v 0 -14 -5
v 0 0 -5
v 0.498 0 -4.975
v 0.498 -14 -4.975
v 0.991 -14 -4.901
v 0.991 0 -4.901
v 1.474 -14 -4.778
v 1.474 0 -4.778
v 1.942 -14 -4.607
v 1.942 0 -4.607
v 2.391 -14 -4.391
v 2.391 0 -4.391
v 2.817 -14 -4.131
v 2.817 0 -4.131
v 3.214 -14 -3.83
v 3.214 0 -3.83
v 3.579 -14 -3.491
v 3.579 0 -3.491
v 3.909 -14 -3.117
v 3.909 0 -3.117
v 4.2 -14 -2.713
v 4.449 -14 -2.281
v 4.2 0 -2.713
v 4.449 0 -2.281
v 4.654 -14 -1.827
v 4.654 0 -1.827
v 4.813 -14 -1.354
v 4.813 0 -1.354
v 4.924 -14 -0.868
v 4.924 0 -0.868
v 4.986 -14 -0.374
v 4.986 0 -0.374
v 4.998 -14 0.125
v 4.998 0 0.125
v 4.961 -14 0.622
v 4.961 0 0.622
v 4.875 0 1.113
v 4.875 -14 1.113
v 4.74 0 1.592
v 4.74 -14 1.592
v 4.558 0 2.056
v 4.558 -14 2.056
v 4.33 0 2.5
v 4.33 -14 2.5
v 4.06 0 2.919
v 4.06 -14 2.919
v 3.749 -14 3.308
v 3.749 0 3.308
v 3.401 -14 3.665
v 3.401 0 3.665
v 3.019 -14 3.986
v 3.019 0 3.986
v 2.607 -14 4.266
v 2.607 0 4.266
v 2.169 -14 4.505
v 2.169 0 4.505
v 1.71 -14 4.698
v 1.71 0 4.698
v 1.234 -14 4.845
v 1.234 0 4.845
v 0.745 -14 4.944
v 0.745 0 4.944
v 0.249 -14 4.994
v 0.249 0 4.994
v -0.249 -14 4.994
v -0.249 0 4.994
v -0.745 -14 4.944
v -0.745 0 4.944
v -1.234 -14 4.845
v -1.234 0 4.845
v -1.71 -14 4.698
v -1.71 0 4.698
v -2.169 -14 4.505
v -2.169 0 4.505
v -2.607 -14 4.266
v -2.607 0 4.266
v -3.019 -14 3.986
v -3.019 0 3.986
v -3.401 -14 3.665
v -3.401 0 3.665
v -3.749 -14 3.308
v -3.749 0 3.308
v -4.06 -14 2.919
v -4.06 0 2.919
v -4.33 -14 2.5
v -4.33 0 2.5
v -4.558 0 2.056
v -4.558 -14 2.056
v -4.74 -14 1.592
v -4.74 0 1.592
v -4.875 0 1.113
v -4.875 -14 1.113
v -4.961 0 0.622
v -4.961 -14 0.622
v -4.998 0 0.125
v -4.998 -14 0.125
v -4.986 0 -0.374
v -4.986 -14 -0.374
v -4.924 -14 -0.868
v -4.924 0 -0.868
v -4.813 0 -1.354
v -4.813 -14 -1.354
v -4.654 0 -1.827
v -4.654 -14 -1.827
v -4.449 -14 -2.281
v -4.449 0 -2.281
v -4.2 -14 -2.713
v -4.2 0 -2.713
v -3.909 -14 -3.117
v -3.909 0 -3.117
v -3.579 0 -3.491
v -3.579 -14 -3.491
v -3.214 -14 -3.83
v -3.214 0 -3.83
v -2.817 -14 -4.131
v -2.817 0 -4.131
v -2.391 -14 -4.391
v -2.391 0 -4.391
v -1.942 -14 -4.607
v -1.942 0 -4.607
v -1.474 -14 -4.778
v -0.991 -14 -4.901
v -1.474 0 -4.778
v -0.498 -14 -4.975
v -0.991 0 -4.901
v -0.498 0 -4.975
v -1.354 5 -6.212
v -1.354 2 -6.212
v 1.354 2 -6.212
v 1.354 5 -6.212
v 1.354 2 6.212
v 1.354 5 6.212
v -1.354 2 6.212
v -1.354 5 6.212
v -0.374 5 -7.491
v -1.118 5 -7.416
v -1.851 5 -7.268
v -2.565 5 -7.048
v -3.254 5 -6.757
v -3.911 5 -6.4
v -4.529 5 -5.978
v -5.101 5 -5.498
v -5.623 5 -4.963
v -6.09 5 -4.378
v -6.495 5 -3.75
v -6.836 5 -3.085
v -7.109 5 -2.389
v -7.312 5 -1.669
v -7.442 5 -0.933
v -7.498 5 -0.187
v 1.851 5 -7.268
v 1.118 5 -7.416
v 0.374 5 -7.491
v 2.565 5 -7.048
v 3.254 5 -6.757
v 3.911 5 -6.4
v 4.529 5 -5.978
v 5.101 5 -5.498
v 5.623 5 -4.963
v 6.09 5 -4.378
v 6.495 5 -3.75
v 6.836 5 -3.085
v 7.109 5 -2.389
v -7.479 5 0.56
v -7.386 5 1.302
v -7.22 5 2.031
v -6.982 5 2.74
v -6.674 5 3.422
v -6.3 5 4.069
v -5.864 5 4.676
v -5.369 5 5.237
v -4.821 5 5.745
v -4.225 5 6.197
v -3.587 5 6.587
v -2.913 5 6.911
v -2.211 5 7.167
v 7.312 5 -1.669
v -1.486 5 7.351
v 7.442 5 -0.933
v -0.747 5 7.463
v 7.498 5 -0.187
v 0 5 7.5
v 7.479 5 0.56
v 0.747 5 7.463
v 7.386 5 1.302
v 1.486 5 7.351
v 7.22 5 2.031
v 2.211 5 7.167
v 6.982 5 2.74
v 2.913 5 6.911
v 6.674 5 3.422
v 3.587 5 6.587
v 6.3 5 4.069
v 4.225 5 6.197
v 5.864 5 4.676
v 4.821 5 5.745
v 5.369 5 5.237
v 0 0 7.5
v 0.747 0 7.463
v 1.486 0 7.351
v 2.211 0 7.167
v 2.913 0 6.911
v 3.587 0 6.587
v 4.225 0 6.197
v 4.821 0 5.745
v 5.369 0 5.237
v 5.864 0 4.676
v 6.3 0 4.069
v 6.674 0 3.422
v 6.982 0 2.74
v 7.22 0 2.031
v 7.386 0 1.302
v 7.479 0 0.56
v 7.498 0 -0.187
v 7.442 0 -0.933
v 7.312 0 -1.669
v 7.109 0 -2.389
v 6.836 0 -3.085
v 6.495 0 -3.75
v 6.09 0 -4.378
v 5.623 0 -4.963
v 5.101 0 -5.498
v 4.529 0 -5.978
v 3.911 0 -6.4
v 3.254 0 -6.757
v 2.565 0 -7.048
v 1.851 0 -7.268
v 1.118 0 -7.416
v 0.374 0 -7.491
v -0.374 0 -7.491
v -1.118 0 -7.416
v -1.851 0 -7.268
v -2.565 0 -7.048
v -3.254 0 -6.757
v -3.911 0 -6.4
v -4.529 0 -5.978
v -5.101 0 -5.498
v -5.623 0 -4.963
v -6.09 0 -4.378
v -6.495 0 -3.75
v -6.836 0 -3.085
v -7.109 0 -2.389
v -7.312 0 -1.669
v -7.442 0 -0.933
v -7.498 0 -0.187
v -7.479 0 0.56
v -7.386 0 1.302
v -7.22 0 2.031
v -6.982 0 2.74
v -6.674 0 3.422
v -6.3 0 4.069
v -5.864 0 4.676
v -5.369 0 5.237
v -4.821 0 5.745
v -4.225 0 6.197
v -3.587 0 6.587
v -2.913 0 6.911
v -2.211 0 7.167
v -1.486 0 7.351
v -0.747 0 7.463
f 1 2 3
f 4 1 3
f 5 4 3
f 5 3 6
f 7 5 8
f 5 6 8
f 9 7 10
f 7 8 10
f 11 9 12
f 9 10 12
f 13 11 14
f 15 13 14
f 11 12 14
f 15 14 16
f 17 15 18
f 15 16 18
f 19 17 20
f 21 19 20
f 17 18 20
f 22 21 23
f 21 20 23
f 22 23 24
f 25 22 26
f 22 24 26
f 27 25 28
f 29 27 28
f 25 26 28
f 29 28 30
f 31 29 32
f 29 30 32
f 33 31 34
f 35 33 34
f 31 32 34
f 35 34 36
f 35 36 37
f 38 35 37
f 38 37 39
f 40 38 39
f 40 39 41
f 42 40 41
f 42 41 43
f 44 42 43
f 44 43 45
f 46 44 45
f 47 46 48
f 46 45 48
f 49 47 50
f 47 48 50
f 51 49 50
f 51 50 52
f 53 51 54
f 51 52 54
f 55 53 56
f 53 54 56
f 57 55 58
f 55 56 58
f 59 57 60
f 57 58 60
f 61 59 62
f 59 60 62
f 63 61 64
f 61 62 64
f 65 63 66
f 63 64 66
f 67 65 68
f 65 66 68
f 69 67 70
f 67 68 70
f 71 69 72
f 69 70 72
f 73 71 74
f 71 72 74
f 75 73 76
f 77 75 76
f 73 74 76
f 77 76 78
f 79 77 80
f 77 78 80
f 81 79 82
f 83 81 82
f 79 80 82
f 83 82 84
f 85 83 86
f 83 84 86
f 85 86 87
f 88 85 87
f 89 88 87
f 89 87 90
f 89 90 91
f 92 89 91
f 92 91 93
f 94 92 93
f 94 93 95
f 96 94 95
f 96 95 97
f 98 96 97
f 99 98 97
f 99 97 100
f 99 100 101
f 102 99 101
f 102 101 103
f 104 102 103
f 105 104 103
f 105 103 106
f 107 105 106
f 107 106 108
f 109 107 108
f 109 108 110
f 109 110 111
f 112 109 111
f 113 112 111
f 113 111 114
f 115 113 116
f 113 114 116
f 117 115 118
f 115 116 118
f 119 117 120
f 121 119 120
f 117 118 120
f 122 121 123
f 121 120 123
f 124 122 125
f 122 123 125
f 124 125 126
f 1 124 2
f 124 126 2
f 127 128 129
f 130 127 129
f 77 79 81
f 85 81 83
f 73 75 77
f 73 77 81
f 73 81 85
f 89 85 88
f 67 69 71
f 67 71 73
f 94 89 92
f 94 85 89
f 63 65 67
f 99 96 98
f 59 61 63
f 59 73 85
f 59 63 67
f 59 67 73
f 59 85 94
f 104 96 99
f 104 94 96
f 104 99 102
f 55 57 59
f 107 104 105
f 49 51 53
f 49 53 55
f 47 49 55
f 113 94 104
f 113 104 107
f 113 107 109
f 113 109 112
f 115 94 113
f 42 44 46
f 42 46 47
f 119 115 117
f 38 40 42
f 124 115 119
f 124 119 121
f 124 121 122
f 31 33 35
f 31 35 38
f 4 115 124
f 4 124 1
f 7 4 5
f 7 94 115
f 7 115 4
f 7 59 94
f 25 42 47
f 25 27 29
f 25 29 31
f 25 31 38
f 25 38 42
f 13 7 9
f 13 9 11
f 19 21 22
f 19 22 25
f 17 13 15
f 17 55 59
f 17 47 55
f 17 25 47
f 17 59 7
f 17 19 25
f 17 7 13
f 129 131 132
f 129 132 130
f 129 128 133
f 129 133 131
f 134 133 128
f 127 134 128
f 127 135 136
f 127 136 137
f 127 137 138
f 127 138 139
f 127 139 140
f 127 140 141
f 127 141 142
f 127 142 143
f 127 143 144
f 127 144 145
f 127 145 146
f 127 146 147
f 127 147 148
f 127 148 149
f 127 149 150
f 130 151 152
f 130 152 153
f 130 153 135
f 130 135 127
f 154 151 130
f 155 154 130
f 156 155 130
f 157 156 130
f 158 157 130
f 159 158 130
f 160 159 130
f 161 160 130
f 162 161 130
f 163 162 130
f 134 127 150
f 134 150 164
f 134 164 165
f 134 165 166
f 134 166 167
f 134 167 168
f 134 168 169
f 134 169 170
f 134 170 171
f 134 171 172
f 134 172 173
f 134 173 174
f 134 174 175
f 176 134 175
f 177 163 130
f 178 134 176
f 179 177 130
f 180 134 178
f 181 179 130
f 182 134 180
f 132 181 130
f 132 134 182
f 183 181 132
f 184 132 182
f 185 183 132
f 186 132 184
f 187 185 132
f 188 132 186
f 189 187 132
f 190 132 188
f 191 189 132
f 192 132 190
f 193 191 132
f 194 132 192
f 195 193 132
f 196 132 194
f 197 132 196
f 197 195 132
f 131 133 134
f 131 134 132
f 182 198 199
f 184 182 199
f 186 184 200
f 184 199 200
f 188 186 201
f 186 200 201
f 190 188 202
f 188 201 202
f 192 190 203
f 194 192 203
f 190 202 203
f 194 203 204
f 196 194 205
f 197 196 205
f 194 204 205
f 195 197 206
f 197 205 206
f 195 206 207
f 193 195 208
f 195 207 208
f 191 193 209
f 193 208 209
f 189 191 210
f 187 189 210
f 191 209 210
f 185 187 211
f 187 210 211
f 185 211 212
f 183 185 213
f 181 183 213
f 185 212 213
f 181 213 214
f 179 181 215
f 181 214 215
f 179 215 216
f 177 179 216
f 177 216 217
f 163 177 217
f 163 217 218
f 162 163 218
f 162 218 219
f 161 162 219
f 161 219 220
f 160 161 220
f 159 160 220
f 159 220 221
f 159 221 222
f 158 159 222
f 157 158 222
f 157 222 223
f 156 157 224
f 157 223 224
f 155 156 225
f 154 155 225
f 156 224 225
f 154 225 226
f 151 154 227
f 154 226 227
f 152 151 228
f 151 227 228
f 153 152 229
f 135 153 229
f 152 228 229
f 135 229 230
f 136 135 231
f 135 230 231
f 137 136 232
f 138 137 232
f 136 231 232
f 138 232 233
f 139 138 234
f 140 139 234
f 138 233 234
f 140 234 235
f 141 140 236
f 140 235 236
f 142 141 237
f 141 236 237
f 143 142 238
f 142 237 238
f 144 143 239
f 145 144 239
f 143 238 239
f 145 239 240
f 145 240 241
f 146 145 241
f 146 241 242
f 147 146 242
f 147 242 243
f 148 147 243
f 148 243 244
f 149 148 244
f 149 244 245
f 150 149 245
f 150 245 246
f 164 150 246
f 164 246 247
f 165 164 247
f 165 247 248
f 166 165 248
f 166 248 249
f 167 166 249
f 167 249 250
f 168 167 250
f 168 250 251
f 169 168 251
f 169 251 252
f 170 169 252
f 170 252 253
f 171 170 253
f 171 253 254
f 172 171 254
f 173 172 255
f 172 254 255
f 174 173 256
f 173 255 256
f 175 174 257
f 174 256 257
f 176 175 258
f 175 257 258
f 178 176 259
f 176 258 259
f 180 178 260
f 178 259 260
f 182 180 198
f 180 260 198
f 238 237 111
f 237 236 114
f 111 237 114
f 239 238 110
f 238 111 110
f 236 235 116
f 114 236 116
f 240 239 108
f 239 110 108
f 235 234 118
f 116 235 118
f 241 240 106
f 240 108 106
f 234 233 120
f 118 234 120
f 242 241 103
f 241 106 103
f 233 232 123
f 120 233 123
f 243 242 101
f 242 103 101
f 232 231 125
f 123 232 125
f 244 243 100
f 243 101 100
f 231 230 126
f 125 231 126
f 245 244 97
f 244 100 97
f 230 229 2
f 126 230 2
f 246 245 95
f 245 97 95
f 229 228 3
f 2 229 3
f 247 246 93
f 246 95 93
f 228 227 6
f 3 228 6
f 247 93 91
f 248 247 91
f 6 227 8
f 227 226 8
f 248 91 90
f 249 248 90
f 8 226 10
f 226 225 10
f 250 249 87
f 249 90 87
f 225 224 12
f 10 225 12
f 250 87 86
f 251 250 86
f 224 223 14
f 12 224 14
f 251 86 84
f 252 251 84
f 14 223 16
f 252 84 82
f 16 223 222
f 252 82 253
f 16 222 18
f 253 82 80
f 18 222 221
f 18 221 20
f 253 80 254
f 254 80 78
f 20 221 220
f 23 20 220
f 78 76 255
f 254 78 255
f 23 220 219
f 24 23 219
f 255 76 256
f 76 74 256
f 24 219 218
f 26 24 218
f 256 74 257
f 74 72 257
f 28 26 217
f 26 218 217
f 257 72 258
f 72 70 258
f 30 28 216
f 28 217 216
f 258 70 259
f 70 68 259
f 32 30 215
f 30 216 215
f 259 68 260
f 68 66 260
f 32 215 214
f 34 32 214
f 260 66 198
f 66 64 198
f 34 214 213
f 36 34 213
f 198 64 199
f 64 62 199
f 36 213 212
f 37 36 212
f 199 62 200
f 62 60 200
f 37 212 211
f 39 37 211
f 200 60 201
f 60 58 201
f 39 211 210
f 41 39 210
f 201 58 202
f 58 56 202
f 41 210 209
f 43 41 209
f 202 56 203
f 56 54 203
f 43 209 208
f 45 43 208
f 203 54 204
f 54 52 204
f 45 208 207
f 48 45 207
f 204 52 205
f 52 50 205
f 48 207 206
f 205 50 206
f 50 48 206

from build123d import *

# Parameters (mm, degrees)
SKETCH_1_R               = 7.5
EXTRUDE_1_DEPTH          = 5
SKETCH_2_R               = 5
EXTRUDE_2_DEPTH          = 14
CUT_EXTRUDE_1_DEPTH      = 22.760055147
CUT_EXTRUDE_1_DEPTH_BACK = 3
SKETCH_3_W               = 2.708105792
SKETCH_3_H               = 12.424551298


with BuildPart() as part:
    # 草图1 → 凸台-拉伸1 (new body)
    with BuildSketch(Plane(origin=(0, 0, 0), x_dir=(1, 0, 0), z_dir=(0, 1, 0))):
        with Locations(Location((0, 0, 0), (0, 0, 270))):
            Circle(SKETCH_1_R)
    extrude(amount=EXTRUDE_1_DEPTH)

    # 草图2 → 凸台-拉伸2 (add)
    with BuildSketch(Plane(origin=(0, 0, 0), x_dir=(-1, 0, 0), z_dir=(0, -1, 0))):
        with Locations(Location((0, 0, 0), (0, 0, 90))):
            Circle(SKETCH_2_R)
    extrude(amount=EXTRUDE_2_DEPTH)

    # 草图3 → 切除-拉伸1 (cut, two sides: drawn at the far end of the back side and taken through both)
    with BuildSketch(Plane(origin=(0, 5, 0), x_dir=(1, 0, 0), z_dir=(0, 1, 0)).offset(-CUT_EXTRUDE_1_DEPTH_BACK)):
        Rectangle(SKETCH_3_W, SKETCH_3_H)
    extrude(amount=CUT_EXTRUDE_1_DEPTH + CUT_EXTRUDE_1_DEPTH_BACK, mode=Mode.SUBTRACT)


solid = part.part
